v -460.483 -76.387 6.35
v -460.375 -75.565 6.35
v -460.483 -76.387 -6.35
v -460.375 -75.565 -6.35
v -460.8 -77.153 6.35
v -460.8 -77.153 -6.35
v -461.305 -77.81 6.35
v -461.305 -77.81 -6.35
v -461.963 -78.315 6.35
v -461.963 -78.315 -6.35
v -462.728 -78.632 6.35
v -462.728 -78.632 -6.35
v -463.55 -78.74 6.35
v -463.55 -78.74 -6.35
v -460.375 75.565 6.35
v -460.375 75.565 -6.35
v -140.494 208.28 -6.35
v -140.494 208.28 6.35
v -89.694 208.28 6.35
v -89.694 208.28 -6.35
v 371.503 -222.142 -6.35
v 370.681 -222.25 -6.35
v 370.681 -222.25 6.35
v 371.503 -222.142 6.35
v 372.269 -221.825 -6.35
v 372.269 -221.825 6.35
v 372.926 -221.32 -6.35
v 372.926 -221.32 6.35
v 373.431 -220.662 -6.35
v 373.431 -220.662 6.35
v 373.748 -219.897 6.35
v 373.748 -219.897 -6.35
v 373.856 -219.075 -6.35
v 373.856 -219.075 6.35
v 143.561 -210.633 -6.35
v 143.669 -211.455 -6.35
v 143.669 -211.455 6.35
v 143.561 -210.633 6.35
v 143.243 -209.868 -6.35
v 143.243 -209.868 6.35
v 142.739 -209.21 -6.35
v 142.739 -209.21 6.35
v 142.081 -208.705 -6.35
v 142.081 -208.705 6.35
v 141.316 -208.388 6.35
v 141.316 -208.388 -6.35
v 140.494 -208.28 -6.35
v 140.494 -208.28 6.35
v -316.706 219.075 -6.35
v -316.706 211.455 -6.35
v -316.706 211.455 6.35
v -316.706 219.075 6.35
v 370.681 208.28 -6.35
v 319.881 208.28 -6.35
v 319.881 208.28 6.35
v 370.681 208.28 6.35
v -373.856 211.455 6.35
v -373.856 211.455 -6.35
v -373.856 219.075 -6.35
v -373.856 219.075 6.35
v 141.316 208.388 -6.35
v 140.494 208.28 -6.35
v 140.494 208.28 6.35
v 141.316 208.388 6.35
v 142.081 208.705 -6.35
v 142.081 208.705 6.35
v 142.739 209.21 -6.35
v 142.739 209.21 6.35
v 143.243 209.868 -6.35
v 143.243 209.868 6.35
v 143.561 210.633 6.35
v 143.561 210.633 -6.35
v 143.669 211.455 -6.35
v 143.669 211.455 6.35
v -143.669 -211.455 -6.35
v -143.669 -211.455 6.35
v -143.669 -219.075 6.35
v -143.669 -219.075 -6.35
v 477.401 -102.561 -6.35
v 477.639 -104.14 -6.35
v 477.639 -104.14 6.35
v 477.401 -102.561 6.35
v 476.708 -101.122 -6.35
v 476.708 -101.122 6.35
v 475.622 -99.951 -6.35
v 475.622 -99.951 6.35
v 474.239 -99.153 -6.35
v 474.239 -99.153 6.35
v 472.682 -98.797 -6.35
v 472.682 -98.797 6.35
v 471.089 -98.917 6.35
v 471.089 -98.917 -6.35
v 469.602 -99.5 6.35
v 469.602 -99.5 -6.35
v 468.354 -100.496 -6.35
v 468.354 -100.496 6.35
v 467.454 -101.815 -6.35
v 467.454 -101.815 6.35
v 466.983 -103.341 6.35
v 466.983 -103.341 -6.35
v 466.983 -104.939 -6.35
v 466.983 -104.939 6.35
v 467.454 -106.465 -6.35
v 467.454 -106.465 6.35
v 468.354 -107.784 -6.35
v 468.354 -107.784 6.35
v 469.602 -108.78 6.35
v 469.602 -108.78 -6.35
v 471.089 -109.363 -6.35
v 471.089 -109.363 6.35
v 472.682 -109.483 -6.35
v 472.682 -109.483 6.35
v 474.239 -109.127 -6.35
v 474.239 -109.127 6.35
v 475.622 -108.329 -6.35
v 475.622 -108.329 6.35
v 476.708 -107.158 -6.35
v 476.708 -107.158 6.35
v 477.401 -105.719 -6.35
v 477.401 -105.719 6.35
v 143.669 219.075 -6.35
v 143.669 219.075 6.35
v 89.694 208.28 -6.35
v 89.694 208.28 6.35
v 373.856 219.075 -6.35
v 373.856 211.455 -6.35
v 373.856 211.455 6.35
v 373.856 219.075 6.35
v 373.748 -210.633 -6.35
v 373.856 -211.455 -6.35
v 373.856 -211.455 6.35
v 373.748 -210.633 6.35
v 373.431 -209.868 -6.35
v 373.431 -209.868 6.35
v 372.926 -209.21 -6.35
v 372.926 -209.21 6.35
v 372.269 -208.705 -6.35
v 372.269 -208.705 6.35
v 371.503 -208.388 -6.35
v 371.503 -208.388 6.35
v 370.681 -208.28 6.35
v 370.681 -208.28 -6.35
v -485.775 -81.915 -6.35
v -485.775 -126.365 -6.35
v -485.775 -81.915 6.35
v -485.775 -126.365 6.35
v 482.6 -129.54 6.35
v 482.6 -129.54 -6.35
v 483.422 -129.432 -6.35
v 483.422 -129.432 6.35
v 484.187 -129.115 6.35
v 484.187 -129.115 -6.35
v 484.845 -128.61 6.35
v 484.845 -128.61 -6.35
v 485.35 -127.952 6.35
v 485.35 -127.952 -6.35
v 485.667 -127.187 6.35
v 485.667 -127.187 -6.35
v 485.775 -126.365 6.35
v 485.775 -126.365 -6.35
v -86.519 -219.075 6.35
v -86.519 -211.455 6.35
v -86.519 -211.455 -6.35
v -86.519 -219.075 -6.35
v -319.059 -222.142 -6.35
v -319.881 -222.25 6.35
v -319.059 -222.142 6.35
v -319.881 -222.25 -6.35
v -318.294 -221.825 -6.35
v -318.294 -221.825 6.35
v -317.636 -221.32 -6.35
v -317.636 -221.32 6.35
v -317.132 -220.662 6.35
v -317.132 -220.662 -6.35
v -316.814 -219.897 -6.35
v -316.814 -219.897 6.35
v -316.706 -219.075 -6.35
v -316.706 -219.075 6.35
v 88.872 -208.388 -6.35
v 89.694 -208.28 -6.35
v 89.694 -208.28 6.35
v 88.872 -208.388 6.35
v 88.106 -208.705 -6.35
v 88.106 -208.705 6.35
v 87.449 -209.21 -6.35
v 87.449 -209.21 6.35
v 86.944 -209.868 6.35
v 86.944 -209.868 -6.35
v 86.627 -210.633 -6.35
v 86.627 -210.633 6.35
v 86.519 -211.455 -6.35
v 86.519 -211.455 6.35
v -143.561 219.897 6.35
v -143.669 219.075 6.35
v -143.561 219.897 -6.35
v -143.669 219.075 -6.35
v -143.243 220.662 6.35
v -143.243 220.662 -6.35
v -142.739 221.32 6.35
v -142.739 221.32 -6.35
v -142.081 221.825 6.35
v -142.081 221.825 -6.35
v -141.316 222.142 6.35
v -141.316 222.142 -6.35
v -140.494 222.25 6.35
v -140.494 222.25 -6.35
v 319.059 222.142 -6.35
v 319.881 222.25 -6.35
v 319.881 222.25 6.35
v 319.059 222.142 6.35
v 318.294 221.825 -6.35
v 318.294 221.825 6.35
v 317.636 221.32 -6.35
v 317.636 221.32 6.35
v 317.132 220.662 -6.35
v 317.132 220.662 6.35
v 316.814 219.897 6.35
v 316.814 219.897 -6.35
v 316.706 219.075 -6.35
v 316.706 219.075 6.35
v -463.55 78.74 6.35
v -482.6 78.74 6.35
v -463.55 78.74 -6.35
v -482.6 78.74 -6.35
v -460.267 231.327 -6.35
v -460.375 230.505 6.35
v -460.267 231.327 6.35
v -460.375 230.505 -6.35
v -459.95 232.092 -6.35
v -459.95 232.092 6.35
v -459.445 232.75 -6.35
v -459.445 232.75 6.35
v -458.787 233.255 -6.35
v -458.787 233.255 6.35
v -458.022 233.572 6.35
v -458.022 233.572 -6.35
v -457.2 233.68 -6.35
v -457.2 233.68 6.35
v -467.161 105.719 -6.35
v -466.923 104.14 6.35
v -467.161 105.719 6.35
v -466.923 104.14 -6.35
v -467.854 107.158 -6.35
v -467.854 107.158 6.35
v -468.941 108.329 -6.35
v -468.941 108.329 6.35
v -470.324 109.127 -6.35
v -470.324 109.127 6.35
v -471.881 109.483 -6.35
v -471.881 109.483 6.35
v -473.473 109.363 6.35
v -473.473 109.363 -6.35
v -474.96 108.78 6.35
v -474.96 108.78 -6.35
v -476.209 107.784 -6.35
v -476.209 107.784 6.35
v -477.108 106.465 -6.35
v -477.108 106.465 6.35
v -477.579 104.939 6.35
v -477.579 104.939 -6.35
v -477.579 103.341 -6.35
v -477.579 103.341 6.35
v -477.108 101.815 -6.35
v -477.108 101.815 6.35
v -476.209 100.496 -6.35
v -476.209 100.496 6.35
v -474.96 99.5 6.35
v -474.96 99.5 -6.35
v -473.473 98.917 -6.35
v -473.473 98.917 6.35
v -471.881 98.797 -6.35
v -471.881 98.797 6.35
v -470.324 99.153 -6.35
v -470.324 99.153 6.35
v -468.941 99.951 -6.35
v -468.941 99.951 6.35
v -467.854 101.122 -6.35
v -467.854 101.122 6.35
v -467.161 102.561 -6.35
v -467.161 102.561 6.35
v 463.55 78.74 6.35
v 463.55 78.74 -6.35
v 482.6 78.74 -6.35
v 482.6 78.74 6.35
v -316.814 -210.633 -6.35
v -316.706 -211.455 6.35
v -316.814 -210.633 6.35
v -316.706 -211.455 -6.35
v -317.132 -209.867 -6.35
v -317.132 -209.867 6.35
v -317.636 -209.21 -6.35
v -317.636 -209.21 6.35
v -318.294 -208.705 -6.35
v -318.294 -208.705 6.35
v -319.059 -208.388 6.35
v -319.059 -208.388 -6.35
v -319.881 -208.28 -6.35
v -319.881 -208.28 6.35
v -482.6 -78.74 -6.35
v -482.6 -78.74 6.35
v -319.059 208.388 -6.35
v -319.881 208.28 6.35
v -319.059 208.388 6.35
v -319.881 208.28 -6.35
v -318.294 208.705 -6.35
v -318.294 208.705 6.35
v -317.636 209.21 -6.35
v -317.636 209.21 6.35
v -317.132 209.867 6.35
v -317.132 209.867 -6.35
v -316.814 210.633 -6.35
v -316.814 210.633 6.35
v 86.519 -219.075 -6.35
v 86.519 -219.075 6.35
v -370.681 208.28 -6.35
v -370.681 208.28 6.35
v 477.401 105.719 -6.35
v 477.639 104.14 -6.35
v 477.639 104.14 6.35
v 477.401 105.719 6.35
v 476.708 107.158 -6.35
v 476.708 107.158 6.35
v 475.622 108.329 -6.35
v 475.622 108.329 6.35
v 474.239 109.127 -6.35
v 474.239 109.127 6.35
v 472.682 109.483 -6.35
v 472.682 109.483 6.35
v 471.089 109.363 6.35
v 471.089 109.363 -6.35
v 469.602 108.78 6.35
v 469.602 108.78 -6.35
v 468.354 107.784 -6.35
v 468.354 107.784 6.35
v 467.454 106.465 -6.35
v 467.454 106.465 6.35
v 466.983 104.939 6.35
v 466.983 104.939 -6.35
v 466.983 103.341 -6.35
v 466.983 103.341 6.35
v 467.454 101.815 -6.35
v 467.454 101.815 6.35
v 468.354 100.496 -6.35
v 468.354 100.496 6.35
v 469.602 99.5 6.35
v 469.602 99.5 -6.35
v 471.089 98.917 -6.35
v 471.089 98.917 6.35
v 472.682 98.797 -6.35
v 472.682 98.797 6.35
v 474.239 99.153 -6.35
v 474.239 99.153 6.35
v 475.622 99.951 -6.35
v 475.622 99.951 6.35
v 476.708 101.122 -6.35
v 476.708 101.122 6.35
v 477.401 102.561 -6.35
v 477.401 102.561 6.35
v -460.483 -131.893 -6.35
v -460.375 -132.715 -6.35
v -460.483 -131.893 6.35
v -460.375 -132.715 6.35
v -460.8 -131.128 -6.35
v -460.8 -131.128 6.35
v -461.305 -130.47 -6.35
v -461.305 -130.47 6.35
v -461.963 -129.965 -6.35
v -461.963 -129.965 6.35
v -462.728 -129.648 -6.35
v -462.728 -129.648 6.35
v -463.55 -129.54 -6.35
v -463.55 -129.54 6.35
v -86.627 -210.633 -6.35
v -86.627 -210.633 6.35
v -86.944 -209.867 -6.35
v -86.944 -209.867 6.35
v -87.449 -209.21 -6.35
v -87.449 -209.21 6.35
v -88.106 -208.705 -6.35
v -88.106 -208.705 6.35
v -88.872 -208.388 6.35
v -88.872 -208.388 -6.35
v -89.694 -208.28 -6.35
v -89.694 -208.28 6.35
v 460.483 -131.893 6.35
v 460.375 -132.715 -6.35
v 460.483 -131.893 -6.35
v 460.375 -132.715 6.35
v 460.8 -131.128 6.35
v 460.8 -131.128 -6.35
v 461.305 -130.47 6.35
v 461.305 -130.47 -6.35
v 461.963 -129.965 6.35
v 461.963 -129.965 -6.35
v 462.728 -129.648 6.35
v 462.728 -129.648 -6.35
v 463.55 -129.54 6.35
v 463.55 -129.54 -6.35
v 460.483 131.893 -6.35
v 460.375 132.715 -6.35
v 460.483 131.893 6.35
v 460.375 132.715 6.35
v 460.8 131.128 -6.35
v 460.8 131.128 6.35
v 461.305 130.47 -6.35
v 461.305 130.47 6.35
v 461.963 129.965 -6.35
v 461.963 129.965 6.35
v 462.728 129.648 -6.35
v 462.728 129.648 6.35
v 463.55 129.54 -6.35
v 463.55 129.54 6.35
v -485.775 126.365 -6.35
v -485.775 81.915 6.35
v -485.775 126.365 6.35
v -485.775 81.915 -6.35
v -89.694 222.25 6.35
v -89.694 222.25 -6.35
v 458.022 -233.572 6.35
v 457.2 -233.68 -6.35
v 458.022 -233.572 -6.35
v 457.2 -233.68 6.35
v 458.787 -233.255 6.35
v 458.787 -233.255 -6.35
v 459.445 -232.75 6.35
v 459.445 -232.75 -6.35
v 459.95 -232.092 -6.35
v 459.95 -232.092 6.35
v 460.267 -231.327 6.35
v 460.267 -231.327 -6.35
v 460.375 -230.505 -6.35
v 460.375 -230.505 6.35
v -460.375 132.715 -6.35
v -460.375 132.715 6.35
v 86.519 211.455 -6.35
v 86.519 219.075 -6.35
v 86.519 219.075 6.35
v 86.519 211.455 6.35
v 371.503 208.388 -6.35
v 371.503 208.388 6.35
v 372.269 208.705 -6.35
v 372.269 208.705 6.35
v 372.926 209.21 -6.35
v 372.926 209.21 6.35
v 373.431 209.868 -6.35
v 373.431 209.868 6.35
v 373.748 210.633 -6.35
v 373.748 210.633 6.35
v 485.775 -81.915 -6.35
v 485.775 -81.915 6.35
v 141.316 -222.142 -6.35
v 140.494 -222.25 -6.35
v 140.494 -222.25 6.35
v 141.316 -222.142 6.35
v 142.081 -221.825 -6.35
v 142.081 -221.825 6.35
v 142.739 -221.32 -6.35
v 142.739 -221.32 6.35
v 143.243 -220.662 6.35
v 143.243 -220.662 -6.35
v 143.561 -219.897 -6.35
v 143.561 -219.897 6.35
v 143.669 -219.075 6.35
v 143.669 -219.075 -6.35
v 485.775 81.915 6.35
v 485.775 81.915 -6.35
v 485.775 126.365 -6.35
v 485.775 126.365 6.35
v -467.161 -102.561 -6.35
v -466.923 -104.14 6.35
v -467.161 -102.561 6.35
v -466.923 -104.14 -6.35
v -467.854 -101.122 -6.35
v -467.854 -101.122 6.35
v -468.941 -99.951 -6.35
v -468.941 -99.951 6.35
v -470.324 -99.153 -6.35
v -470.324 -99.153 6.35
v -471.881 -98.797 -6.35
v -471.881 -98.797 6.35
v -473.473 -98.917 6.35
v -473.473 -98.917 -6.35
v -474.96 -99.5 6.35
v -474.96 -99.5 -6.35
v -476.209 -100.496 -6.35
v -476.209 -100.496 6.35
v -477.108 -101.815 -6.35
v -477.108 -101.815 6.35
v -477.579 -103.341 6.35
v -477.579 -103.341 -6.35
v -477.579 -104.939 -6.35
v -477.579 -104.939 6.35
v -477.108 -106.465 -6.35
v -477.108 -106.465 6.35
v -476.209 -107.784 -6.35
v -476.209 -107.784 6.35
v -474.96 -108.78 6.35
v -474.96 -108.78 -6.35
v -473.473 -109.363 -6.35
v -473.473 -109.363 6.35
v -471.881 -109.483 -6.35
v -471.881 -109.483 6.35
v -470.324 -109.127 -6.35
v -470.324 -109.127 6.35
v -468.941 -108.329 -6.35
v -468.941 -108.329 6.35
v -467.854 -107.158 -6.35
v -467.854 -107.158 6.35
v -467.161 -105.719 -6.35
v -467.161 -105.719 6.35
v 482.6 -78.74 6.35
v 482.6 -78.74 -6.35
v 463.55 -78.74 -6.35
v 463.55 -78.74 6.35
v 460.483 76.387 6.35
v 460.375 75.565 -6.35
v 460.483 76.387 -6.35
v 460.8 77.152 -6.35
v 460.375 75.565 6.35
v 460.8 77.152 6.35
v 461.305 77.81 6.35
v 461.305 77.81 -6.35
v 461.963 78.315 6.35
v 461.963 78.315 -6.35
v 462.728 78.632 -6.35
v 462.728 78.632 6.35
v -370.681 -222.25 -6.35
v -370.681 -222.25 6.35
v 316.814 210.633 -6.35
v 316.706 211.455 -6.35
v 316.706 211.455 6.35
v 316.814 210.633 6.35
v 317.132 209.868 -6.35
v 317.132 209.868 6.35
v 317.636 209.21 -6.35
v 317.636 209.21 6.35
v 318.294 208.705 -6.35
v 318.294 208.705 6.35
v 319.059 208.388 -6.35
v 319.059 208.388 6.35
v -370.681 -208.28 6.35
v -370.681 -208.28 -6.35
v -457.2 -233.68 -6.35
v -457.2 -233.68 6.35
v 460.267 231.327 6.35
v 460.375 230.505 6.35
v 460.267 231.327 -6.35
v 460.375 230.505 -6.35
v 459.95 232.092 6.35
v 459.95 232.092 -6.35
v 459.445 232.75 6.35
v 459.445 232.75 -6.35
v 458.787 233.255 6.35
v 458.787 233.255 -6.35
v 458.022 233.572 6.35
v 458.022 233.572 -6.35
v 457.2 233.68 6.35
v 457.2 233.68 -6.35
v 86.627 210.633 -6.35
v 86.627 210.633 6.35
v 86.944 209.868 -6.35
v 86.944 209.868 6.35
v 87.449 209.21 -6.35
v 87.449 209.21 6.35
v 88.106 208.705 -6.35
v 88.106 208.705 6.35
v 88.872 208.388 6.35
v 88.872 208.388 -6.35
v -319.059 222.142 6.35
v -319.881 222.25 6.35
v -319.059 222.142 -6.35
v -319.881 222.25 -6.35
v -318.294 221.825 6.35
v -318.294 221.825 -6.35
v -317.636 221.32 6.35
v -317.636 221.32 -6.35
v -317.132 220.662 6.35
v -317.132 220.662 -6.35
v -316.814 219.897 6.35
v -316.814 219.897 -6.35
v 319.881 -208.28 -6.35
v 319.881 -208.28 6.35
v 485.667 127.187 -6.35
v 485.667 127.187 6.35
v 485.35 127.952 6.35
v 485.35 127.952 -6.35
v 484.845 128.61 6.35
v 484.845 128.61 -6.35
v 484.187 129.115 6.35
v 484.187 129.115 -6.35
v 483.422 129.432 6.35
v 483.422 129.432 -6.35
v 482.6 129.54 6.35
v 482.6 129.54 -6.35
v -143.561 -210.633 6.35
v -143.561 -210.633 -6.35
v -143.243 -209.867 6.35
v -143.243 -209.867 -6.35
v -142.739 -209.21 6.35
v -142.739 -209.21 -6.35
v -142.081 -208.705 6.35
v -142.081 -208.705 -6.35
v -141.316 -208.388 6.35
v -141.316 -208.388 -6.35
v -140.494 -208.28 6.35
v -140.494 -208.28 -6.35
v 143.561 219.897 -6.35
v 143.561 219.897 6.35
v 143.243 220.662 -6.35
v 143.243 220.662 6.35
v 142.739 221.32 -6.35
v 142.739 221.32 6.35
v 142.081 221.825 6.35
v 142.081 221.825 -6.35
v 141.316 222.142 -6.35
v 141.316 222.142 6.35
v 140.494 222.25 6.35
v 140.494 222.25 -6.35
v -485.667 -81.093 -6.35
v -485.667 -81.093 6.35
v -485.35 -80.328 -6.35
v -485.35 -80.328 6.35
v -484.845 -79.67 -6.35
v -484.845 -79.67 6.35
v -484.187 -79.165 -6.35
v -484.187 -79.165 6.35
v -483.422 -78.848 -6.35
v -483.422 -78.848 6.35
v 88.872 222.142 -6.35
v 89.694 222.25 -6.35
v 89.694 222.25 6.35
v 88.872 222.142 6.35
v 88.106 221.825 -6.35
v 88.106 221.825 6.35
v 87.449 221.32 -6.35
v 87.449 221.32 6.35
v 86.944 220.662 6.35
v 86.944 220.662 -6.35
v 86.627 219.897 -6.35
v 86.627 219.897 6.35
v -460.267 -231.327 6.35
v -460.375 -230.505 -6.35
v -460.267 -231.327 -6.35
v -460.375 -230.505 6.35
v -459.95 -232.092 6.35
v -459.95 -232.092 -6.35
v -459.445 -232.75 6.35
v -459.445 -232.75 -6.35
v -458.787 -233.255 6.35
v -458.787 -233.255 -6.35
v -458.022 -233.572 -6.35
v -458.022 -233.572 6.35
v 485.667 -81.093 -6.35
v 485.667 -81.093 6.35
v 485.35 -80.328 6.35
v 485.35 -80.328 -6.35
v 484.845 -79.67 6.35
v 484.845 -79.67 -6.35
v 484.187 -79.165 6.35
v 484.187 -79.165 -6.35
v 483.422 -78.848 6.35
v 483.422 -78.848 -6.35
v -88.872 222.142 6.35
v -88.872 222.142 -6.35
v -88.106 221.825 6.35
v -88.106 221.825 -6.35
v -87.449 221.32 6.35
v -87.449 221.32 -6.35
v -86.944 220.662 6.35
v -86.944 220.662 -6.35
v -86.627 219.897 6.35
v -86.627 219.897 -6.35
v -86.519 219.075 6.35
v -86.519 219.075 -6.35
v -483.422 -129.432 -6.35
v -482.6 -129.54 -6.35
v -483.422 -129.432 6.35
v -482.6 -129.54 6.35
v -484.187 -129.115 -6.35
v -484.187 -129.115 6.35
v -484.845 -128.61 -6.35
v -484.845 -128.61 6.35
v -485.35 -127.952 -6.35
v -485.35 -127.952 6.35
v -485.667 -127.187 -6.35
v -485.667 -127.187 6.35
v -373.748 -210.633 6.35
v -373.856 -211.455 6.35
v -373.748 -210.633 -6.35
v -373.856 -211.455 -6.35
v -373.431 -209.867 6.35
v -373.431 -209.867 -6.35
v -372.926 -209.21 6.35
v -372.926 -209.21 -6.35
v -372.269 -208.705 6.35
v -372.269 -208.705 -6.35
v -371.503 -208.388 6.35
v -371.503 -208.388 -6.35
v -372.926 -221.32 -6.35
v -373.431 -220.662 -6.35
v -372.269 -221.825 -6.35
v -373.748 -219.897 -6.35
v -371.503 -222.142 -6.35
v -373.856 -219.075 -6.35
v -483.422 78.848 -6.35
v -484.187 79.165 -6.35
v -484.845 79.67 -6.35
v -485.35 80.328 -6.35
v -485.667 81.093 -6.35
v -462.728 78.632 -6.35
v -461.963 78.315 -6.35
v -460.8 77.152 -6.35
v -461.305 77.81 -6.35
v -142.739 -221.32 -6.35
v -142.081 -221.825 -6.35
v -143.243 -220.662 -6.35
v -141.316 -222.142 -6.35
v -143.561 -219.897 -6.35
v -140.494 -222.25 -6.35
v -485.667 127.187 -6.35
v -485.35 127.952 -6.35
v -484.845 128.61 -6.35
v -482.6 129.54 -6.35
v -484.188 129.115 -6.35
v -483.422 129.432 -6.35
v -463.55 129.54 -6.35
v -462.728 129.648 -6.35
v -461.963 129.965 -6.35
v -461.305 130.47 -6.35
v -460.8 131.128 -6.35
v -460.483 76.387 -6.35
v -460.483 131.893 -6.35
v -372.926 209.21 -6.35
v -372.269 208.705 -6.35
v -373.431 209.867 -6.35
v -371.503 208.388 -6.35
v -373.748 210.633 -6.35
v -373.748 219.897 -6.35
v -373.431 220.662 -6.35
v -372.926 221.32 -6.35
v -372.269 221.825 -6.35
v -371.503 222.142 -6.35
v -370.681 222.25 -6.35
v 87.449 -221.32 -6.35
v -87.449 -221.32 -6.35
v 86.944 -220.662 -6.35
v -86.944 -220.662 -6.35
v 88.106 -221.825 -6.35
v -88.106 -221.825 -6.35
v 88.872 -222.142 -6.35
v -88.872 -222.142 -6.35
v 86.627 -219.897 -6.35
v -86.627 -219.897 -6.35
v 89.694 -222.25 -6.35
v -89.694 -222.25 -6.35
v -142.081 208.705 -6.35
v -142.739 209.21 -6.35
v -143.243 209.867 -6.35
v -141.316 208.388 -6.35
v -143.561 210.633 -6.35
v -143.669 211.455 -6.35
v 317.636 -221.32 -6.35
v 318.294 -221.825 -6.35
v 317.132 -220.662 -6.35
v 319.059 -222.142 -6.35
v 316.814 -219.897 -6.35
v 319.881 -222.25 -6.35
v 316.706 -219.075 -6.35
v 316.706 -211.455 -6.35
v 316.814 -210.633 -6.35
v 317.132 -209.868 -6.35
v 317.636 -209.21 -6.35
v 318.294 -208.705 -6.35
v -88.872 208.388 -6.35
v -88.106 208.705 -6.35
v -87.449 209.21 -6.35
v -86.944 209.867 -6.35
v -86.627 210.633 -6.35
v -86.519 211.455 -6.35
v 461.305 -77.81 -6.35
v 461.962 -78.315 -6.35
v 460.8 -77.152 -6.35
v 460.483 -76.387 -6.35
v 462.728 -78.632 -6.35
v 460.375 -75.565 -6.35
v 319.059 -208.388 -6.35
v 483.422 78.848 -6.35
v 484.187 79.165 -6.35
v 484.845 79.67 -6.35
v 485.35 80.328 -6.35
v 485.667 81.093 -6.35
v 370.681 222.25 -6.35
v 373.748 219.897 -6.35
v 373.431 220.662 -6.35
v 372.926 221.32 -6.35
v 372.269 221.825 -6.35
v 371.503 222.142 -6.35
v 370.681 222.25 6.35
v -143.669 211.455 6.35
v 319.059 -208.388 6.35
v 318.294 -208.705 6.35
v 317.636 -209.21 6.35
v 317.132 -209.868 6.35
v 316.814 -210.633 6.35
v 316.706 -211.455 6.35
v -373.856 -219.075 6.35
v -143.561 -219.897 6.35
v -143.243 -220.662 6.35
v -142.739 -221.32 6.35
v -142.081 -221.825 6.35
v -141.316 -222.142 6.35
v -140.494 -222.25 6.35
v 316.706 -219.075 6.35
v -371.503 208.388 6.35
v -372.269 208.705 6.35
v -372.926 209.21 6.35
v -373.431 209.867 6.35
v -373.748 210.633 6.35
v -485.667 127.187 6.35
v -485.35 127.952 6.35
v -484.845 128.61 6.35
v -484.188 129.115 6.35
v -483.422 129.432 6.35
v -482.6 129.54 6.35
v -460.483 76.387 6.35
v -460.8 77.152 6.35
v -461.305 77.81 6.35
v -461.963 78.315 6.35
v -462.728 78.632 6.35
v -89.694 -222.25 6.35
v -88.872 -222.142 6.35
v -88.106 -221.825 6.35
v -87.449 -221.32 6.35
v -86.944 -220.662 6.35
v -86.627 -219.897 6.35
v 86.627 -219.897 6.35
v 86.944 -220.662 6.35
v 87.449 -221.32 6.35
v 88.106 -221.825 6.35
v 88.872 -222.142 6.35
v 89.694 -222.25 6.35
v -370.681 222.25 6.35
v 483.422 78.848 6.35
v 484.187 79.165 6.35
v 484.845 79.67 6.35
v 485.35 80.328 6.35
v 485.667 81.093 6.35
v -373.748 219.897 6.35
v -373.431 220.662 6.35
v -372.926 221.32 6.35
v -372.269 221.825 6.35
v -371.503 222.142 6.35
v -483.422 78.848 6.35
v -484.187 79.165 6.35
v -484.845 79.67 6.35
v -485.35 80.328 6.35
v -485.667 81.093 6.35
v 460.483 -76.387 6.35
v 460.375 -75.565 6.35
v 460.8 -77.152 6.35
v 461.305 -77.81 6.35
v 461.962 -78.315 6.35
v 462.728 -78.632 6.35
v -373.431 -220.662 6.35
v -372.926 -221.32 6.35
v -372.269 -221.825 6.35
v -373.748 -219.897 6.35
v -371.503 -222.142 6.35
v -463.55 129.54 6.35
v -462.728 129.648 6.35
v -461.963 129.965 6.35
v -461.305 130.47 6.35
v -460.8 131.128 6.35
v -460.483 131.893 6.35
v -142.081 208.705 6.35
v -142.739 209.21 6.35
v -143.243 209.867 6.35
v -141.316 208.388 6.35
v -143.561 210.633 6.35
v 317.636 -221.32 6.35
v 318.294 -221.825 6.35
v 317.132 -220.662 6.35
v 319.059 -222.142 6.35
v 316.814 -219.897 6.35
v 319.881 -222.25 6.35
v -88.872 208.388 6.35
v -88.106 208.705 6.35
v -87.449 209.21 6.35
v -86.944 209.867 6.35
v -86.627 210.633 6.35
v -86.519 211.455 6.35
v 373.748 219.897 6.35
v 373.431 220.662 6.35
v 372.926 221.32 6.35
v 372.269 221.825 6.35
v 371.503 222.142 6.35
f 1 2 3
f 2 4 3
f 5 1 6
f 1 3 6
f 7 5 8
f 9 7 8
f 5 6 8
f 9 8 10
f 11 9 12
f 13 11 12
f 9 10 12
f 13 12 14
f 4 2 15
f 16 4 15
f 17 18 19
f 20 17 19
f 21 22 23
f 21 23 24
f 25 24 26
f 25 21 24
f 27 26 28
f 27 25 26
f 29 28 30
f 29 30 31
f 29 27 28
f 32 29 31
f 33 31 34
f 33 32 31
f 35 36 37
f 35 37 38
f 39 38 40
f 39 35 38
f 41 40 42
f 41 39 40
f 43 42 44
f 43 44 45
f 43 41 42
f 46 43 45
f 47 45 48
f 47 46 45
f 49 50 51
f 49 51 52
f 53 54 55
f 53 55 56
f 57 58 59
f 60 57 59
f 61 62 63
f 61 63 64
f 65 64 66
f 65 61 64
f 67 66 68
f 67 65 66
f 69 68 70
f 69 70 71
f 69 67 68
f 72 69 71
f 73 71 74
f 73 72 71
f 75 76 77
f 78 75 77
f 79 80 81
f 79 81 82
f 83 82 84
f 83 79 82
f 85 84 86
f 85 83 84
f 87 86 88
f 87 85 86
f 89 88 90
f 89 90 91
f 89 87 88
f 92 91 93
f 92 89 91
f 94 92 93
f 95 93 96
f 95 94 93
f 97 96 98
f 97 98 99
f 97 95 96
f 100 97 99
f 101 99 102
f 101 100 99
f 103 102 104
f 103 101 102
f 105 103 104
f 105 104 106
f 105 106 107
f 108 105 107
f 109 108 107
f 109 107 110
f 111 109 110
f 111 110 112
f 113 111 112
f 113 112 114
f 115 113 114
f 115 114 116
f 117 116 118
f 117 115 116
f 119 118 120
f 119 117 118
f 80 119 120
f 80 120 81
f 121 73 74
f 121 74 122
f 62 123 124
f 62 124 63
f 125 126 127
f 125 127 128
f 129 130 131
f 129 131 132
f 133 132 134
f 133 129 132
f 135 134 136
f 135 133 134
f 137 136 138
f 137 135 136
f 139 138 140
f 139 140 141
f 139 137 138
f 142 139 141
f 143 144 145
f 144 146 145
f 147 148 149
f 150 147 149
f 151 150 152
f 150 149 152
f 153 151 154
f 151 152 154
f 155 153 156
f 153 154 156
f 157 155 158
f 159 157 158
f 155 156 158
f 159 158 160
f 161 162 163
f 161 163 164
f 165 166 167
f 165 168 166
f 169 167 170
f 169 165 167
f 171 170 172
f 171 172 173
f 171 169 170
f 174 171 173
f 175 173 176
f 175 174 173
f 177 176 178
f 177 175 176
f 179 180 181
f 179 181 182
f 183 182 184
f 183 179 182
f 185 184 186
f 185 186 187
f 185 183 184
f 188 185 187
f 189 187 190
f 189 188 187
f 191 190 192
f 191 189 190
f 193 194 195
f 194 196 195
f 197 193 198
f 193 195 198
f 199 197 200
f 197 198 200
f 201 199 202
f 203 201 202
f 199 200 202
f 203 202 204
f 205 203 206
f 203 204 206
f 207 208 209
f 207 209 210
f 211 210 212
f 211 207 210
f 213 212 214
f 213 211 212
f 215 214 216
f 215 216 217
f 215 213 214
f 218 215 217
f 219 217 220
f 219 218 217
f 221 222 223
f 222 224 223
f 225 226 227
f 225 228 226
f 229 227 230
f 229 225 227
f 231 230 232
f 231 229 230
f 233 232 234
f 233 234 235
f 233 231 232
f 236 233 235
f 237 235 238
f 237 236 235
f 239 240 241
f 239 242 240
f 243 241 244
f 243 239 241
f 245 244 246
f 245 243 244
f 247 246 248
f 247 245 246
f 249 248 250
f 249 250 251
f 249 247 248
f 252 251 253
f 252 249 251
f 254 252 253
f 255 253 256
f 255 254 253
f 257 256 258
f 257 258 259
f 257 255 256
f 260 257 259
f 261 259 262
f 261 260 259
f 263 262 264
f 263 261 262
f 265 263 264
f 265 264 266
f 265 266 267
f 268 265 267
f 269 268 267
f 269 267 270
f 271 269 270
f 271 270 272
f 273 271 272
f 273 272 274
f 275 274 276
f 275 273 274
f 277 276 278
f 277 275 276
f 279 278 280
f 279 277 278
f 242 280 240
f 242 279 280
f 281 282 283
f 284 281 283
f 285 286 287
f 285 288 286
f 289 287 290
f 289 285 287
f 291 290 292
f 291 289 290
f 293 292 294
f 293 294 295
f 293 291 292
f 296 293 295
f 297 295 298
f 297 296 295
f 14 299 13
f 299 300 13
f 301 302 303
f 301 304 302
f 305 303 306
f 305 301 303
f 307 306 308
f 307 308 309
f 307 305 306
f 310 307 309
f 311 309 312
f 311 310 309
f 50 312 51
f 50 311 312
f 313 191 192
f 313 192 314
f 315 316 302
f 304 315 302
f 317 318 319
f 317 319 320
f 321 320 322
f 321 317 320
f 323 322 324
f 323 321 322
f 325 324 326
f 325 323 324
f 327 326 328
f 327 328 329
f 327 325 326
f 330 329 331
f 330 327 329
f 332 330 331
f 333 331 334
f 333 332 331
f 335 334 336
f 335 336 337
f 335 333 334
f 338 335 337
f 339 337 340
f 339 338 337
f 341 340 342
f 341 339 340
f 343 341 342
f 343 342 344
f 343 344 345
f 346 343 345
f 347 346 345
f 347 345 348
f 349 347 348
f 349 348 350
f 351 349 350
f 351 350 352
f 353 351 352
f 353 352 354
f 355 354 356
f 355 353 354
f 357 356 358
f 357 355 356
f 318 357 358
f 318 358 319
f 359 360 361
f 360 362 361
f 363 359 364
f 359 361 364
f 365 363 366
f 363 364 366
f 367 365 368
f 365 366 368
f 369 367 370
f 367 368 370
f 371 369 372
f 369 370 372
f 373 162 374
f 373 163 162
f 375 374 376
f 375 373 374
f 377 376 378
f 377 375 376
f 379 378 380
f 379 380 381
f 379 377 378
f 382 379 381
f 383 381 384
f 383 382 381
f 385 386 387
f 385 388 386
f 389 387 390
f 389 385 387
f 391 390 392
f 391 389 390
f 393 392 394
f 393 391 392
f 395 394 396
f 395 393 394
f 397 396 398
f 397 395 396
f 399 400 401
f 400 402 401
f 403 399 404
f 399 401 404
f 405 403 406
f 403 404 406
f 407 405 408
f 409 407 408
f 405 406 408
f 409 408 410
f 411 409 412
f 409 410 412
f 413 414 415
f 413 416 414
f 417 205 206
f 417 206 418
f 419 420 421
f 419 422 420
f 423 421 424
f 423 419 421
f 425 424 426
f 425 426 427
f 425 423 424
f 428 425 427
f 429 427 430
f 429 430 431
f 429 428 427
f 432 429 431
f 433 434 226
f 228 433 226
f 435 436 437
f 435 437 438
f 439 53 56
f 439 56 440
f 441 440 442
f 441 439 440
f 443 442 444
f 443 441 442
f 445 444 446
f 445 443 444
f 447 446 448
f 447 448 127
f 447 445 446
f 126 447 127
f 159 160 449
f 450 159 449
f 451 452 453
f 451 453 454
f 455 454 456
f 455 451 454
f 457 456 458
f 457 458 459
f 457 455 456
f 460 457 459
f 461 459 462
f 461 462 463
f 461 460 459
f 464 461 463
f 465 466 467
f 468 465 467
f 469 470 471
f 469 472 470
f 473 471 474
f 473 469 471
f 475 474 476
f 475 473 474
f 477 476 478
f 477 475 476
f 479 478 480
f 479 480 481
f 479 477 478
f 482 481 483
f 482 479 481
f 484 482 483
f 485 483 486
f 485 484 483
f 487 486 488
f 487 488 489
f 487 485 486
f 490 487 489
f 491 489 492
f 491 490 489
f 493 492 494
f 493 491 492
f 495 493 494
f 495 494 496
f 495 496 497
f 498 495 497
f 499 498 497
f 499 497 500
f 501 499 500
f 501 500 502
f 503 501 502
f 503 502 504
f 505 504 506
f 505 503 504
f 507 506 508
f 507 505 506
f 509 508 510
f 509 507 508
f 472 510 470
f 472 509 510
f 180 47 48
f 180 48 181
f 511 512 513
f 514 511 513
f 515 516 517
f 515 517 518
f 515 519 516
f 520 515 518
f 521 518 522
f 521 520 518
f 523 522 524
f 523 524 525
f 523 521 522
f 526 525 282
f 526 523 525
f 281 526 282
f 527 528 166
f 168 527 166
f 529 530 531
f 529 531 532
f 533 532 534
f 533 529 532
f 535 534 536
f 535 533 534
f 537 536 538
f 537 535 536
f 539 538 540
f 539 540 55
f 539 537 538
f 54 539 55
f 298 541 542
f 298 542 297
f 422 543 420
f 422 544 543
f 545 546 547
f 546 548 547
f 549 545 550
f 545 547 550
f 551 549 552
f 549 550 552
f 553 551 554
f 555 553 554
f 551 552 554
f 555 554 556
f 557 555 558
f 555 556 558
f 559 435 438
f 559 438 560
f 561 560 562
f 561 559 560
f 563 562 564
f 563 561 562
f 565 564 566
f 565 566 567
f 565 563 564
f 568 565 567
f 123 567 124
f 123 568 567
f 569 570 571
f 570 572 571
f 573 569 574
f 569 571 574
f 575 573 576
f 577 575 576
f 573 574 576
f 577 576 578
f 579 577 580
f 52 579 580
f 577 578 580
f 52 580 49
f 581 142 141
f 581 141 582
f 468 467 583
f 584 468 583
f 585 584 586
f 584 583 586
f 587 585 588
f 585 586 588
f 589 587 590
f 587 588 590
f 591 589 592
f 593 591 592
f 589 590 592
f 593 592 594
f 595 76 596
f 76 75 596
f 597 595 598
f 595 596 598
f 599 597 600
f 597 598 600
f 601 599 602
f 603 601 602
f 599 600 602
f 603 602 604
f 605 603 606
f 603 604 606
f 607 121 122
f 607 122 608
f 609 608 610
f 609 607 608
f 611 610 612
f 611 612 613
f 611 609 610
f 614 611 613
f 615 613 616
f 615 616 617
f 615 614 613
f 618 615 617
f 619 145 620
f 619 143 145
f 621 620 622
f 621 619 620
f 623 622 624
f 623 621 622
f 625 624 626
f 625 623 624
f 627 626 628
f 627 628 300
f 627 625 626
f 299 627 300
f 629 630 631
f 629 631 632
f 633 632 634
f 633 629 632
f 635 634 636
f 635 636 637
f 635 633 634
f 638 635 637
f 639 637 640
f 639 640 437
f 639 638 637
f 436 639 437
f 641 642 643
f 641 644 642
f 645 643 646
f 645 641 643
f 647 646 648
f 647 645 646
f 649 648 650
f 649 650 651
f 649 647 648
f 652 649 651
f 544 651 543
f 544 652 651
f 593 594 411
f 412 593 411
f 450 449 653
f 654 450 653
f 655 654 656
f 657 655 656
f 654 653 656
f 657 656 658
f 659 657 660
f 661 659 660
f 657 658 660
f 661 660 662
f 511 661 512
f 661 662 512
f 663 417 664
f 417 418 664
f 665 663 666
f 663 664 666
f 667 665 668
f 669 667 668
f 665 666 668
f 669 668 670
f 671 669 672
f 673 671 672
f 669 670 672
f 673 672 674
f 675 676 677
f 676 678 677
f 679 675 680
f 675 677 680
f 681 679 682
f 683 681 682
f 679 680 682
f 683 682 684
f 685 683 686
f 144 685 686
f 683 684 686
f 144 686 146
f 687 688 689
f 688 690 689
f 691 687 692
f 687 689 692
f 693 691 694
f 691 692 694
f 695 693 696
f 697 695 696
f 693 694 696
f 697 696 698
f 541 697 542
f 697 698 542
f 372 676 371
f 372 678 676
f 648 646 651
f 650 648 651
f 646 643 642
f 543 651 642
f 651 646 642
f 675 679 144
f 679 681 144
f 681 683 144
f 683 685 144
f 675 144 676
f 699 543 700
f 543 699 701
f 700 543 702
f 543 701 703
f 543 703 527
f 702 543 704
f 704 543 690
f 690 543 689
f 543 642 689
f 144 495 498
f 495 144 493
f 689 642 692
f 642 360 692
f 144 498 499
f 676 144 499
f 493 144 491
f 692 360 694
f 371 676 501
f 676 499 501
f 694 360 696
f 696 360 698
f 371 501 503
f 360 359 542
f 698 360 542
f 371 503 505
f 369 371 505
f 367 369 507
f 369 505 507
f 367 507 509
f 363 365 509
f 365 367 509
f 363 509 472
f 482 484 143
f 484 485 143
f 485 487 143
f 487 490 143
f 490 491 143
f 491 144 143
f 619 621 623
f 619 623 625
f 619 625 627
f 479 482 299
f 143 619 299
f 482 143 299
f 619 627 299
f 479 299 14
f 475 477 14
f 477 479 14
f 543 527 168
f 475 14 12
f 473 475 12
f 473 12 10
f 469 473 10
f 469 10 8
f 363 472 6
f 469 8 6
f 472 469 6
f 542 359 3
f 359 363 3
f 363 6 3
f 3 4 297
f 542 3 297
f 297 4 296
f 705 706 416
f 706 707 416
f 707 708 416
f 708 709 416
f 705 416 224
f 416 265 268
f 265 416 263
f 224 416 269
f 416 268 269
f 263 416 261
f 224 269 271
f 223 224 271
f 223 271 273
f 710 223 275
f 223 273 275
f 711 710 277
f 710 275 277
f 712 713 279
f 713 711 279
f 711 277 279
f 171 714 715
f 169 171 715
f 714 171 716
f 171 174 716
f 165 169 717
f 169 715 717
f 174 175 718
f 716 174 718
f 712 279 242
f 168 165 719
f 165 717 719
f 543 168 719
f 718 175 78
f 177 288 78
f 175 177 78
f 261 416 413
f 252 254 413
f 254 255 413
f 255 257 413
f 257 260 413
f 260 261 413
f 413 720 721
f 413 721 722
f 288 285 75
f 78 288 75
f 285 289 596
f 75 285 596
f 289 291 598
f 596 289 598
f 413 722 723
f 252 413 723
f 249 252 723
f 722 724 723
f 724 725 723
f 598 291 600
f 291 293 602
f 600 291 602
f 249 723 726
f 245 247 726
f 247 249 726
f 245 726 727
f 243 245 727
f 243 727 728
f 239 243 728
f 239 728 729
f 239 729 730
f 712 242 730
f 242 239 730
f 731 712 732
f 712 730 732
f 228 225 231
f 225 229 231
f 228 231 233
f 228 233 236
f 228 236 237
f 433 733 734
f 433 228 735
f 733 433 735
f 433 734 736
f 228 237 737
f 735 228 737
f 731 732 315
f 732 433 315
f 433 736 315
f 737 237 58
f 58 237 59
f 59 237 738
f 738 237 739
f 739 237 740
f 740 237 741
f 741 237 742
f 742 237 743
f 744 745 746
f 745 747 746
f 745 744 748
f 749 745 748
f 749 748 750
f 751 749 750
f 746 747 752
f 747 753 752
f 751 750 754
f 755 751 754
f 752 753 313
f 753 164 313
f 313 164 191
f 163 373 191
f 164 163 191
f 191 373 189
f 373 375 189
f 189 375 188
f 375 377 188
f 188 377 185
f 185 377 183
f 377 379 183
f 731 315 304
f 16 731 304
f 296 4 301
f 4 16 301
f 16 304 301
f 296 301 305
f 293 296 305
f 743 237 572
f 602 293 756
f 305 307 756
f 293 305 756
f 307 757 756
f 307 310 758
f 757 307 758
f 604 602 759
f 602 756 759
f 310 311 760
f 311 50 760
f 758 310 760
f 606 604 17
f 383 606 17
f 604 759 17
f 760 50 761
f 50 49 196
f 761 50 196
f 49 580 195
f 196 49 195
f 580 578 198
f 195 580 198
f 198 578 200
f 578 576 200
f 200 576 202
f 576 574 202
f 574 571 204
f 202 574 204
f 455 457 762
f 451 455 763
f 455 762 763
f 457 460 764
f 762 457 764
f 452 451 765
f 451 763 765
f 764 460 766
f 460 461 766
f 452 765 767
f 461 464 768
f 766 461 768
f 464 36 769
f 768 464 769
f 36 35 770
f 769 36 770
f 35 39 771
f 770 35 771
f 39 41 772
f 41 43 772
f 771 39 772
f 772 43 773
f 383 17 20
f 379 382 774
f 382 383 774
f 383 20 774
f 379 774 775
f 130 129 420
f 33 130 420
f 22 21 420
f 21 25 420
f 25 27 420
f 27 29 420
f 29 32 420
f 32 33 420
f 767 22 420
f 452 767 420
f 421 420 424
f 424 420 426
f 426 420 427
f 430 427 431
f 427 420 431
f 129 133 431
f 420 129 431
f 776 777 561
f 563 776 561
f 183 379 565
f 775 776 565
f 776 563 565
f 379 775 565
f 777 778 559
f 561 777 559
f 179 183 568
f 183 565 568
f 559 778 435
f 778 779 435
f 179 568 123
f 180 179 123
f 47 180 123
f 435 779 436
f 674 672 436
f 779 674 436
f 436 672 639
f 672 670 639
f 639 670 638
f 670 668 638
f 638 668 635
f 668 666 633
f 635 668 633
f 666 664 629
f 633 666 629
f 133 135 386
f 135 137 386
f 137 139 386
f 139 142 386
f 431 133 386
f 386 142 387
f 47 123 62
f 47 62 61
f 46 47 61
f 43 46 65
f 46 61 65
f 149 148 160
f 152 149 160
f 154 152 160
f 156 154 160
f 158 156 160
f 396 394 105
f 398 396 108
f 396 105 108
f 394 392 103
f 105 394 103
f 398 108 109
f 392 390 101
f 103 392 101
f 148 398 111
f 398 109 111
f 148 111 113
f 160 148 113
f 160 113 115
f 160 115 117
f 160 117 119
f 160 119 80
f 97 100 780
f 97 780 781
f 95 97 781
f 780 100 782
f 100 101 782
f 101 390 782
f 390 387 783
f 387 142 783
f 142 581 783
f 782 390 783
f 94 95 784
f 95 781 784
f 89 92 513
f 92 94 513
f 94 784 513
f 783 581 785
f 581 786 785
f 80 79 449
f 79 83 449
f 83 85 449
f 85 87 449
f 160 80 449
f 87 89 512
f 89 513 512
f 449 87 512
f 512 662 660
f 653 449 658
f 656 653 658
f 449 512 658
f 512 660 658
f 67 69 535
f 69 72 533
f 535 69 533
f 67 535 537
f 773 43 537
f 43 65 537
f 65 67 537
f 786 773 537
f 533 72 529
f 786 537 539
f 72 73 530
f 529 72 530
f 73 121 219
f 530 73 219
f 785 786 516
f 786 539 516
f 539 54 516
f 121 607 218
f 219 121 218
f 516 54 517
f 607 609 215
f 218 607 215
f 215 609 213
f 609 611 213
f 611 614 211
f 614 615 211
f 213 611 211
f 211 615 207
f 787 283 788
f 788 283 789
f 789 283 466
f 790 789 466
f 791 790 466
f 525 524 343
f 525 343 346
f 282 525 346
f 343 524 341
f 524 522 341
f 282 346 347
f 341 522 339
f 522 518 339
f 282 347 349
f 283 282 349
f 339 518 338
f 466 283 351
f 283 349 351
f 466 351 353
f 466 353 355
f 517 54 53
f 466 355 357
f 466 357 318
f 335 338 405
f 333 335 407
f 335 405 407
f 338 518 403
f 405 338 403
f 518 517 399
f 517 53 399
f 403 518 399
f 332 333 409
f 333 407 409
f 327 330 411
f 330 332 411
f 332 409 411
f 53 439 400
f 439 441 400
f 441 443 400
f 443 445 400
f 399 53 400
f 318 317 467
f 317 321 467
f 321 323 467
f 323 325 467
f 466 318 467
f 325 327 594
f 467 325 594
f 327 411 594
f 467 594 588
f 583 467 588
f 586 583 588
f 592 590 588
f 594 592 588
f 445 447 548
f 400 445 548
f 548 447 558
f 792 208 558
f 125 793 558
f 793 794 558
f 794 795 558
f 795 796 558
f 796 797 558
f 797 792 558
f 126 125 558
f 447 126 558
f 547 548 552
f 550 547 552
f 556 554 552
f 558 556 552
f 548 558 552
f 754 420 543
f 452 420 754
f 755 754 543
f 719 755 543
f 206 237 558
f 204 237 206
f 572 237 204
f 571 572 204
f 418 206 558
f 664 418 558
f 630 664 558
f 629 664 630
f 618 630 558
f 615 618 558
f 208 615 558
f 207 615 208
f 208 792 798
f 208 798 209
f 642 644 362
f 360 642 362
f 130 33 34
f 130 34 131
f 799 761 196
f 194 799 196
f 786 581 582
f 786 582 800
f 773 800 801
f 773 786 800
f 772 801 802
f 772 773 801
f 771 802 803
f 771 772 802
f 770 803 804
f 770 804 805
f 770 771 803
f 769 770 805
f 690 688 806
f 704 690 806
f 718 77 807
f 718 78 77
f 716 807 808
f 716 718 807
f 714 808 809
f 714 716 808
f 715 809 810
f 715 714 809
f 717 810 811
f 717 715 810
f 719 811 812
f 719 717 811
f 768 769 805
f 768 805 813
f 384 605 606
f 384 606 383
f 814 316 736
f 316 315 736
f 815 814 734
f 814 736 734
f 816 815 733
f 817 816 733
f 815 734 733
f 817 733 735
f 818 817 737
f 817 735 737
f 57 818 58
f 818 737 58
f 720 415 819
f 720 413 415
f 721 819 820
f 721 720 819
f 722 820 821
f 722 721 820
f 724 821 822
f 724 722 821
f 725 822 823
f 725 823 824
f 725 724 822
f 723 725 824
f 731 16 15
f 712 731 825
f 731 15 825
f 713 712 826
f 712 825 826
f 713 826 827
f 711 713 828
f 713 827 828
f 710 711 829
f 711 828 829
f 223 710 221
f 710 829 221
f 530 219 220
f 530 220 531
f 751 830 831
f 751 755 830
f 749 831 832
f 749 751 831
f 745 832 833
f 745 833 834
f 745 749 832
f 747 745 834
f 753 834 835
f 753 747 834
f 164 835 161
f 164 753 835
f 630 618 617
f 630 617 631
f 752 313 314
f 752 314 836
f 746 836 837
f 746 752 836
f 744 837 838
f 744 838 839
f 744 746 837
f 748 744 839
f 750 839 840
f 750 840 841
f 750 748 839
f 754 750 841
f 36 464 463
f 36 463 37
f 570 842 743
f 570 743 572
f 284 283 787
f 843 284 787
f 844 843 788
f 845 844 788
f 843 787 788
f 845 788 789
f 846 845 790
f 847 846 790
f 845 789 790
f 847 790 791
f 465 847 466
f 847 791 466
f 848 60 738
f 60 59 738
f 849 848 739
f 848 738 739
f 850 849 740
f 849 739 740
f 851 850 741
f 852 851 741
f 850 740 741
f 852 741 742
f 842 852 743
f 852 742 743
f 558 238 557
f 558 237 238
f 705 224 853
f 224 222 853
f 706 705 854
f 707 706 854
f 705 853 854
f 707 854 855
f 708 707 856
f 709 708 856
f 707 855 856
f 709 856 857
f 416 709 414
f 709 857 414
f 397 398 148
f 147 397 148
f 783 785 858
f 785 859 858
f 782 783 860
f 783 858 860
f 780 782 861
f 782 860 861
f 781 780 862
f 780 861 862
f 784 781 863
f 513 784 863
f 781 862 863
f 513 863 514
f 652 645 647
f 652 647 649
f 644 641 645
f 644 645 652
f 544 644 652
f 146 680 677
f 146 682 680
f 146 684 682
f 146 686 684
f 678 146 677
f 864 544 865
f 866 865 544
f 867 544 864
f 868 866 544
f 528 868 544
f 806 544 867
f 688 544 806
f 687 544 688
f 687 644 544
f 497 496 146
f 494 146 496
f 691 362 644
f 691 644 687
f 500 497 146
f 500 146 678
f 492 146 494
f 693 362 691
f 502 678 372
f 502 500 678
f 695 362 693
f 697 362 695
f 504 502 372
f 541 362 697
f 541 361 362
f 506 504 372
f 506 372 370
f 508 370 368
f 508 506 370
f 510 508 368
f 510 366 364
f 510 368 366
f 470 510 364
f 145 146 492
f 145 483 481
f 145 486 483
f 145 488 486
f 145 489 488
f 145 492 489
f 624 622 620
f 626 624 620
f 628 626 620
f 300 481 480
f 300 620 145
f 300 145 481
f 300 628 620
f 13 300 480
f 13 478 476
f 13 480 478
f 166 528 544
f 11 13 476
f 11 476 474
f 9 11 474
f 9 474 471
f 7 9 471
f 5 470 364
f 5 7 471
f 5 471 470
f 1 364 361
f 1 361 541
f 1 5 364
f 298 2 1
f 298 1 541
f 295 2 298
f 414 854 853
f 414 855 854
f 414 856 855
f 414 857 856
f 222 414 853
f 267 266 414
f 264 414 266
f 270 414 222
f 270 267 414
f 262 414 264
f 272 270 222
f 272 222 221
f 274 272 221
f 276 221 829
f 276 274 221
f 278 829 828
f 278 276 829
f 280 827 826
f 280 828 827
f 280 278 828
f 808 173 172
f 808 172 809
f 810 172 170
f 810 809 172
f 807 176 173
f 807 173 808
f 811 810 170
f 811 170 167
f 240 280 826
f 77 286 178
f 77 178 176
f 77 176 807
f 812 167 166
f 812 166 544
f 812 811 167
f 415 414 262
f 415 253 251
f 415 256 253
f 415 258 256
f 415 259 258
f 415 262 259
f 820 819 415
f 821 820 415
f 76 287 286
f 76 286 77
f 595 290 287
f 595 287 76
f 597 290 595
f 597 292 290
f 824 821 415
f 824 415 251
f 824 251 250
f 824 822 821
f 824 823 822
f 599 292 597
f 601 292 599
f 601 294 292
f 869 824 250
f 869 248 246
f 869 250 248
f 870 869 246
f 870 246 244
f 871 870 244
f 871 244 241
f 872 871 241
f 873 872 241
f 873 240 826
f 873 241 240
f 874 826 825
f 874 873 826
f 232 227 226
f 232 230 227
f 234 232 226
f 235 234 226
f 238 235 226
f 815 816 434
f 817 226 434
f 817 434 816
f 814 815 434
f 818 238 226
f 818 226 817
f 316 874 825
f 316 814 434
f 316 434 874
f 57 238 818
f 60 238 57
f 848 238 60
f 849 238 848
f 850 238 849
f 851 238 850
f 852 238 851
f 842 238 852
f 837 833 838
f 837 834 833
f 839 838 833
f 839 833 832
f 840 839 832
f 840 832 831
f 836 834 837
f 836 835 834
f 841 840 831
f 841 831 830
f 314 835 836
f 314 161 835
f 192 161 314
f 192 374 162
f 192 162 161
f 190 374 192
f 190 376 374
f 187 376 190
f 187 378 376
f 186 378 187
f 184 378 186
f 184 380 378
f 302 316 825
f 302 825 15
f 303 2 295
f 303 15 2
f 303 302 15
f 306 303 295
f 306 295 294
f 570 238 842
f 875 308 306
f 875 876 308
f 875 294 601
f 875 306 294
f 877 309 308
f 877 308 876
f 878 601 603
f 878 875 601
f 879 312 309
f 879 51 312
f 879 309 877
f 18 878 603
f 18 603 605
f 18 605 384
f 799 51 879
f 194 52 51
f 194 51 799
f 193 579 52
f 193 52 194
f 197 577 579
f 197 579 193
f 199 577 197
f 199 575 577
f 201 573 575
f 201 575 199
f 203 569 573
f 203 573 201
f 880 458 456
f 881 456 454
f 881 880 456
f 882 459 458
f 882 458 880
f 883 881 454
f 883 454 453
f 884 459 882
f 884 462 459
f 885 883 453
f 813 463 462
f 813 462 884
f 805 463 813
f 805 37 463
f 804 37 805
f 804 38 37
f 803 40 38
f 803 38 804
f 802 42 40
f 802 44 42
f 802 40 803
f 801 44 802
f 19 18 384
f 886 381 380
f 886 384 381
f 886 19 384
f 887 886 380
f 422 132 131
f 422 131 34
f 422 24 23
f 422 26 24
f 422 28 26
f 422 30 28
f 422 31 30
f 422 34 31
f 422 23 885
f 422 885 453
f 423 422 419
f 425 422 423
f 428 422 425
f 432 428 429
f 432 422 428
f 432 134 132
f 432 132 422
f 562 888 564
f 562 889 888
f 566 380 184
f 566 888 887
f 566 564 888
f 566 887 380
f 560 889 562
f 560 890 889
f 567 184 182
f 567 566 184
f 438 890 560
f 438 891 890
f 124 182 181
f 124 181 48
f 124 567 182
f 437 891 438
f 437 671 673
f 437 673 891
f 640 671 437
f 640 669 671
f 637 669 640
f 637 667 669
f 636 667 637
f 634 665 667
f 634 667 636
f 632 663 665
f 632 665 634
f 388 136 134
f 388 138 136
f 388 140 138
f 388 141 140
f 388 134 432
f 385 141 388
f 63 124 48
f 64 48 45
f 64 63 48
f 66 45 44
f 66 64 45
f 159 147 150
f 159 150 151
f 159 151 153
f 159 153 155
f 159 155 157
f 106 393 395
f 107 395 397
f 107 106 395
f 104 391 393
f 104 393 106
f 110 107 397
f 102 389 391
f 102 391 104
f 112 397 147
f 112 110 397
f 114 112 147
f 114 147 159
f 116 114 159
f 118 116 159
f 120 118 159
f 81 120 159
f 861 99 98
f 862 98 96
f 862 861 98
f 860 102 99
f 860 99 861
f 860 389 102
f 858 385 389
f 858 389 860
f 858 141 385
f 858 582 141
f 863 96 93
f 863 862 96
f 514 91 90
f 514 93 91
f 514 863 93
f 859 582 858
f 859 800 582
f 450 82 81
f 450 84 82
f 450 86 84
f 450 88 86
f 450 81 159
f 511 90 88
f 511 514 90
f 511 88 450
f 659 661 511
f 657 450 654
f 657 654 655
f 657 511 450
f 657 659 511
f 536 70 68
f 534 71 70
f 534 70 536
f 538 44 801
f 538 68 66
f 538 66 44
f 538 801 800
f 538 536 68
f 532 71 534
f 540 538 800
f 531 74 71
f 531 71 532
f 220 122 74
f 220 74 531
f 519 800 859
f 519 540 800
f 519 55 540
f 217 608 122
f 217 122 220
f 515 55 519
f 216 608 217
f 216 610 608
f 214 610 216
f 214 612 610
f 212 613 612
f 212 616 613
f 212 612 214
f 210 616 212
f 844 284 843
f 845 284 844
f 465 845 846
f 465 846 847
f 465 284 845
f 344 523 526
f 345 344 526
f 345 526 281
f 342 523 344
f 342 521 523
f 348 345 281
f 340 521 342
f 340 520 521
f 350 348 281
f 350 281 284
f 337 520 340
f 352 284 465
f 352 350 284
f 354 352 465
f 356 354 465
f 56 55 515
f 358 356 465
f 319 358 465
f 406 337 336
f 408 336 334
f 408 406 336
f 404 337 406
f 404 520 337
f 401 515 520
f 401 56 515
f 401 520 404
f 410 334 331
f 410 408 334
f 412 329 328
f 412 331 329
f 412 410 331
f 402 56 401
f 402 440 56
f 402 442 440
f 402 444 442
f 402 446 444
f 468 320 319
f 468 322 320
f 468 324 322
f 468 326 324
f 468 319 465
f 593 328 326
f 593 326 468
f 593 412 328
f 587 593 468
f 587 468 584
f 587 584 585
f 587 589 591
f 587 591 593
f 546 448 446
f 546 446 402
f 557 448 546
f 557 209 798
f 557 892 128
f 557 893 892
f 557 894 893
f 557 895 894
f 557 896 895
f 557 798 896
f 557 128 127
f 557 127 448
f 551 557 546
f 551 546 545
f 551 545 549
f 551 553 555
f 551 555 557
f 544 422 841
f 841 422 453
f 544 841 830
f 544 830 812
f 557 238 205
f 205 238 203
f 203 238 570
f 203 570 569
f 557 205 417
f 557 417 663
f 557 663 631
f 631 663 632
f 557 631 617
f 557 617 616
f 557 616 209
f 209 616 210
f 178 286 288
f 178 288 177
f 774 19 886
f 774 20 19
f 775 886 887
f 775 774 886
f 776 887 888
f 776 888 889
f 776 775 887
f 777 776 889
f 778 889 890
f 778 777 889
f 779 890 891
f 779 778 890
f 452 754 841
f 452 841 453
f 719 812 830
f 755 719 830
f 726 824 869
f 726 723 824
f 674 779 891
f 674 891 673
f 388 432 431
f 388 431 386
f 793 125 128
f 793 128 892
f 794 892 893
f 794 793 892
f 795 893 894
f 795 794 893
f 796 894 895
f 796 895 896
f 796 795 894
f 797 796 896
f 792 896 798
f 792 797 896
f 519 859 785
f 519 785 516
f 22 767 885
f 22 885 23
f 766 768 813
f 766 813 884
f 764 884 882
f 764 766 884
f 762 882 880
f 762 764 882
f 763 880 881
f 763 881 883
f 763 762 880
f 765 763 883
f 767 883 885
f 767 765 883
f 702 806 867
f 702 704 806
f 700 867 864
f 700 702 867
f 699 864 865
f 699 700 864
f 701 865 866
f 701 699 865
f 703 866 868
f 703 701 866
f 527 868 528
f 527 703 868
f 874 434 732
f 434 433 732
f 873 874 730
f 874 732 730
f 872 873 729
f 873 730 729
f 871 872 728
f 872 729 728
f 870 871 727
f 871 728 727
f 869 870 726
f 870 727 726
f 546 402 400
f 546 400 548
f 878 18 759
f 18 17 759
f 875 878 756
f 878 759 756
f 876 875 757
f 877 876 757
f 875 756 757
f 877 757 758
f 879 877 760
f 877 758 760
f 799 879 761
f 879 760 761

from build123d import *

# Parameters (mm, degrees)
SKETCH1_W            = 920.75
SKETCH1_H            = 416.56
BOSS_EXTRUDE1_DEPTH  = 6.35
SKETCH2_W            = 920.75
SKETCH2_H            = 25.4
BOSS_EXTRUDE2_DEPTH  = 6.35
SKETCH3_W            = 57.15
SKETCH3_H            = 13.97
TAB_HOLES_DEPTH      = 517.442419854
SKETCH4_W            = 25.4
SKETCH4_H            = 50.8
SKETCH4_R            = 5.3578125
TABS_DEPTH           = 6.35
FILLET1_R            = 3.175
FILLET2_R            = 3.175
FILLET2_OF_MIRROR2_R = 3.175
MIRROR4_START        = -6.35
MIRROR4_DEPTH        = 12.7
MIRROR4_2_OUTLINE_R  = 5.3578125
MIRROR4_2_DEPTH      = 12.7
FILLET3_R            = 3.175


# Read off the part's stored shape, not the designer's step: Mirror4
with BuildPart() as part:
    # Sketch1 → Boss-Extrude1 (new, symmetric)
    with BuildSketch(Plane.XY):
        Rectangle(SKETCH1_W, SKETCH1_H)
    extrude(amount=BOSS_EXTRUDE1_DEPTH, both=True)

    # Sketch2 → Boss-Extrude2 (add, symmetric)
    with BuildSketch(Plane.XY):
        with Locations((0, 220.98)):
            Rectangle(SKETCH2_W, SKETCH2_H)
        with Locations((0, -220.98)):
            Rectangle(SKETCH2_W, SKETCH2_H)
    extrude(amount=BOSS_EXTRUDE2_DEPTH, both=True)

    # Sketch3 → Tab Holes (cut, through all)
    with BuildSketch(Plane.XY.offset(6.35)):
        with Locations((-345.28125, 215.265)):
            Rectangle(SKETCH3_W, SKETCH3_H)
        with Locations((-115.09375, 215.265)):
            Rectangle(SKETCH3_W, SKETCH3_H)
    tab_holes = extrude(amount=-TAB_HOLES_DEPTH, mode=Mode.SUBTRACT)

    # Sketch4 → Tabs (add, symmetric)
    # profile 1 of 2: a face of its own
    with BuildSketch(Plane.XY):
        with Locations((-473.075, 104.14)):
            Rectangle(SKETCH4_W, SKETCH4_H)
        with Locations((-472.28125, 104.14)):
            Circle(SKETCH4_R, mode=Mode.SUBTRACT)
    # profile 2 of 2: a face of its own
    with BuildSketch(Plane.XY):
        with Locations((-473.075, -104.14)):
            Rectangle(SKETCH4_W, SKETCH4_H)
        with Locations((-472.28125, -104.14)):
            Circle(SKETCH4_R, mode=Mode.SUBTRACT)
    extrude(amount=TABS_DEPTH, both=True)

    # Fillet1
    fillet1_edges = [part.edges().sort_by_distance(p)[0] for p in [
        (-460.375, 233.68, 0),
        (-460.375, -233.68, 0),
        (-460.375, 78.74, 0),
        (-460.375, 129.54, 0),
        (-485.775, 129.54, 0),
        (-485.775, 78.74, 0),
        (-460.375, -129.54, 0),
        (-460.375, -78.74, 0),
        (-485.775, -78.74, 0),
        (-485.775, -129.54, 0),
    ]]
    fillet(fillet1_edges, radius=FILLET1_R)

    # Fillet2
    fillet2_edges = [part.edges().sort_by_distance(p)[0] for p in [
        (-373.85625, 208.28, 0),
        (-373.85625, 222.25, 0),
        (-316.70625, 222.25, 0),
        (-316.70625, 208.28, 0),
        (-143.66875, 208.28, 0),
        (-143.66875, 222.25, 0),
        (-86.51875, 222.25, 0),
        (-86.51875, 208.28, 0),
    ]]
    fillet(fillet2_edges, radius=FILLET2_R)

    # Mirror2: Tab Holes across plane
    add(tab_holes.mirror(Plane.ZX), mode=Mode.SUBTRACT)

    # Fillet2 of Mirror2
    fillet2_of_mirror2_edges = [part.edges().sort_by_distance(p)[0] for p in [
        (-373.85625, -208.28, 0),
        (-373.85625, -222.25, 0),
        (-316.70625, -222.25, 0),
        (-316.70625, -208.28, 0),
        (-143.66875, -208.28, 0),
        (-143.66875, -222.25, 0),
        (-86.51875, -222.25, 0),
        (-86.51875, -208.28, 0),
    ]]
    fillet(fillet2_of_mirror2_edges, radius=FILLET2_OF_MIRROR2_R)

    # Mirror4 outline → Mirror4 (cut)
    with BuildSketch(Plane.XY.offset(MIRROR4_START)):
        with BuildLine():
            Line((140.49375, 222.25), (89.69375, 222.25))
            ThreePointArc((89.69375, 222.25), (87.44868597, 221.32006403), (86.51875, 219.075))
            Line((86.51875, 219.075), (86.51875, 211.455))
            ThreePointArc((86.51875, 211.455), (87.44868597, 209.20993597), (89.69375, 208.28))
            Line((89.69375, 208.28), (140.49375, 208.28))
            ThreePointArc((140.49375, 208.28), (142.73881403, 209.20993597), (143.66875, 211.455))
            Line((143.66875, 211.455), (143.66875, 219.075))
            ThreePointArc((143.66875, 219.075), (142.73881403, 221.32006403), (140.49375, 222.25))
        make_face()
        with BuildLine():
            Line((370.68125, 222.25), (319.88125, 222.25))
            ThreePointArc((319.88125, 222.25), (317.63618597, 221.32006403), (316.70625, 219.075))
            Line((316.70625, 219.075), (316.70625, 211.455))
            ThreePointArc((316.70625, 211.455), (317.63618597, 209.20993597), (319.88125, 208.28))
            Line((319.88125, 208.28), (370.68125, 208.28))
            ThreePointArc((370.68125, 208.28), (372.92631403, 209.20993597), (373.85625, 211.455))
            Line((373.85625, 211.455), (373.85625, 219.075))
            ThreePointArc((373.85625, 219.075), (372.92631403, 221.32006403), (370.68125, 222.25))
        make_face()
        with BuildLine():
            ThreePointArc((143.66875, -211.455), (142.73881403, -209.20993597), (140.49375, -208.28))
            Line((140.49375, -208.28), (89.69375, -208.28))
            ThreePointArc((89.69375, -208.28), (87.44868597, -209.20993597), (86.51875, -211.455))
            Line((86.51875, -211.455), (86.51875, -219.075))
            ThreePointArc((86.51875, -219.075), (87.44868597, -221.32006403), (89.69375, -222.25))
            Line((89.69375, -222.25), (140.49375, -222.25))
            ThreePointArc((140.49375, -222.25), (142.73881403, -221.32006403), (143.66875, -219.075))
            Line((143.66875, -219.075), (143.66875, -211.455))
        make_face()
        with BuildLine():
            ThreePointArc((373.85625, -211.455), (372.92631403, -209.20993597), (370.68125, -208.28))
            Line((370.68125, -208.28), (319.88125, -208.28))
            ThreePointArc((319.88125, -208.28), (317.63618597, -209.20993597), (316.70625, -211.455))
            Line((316.70625, -211.455), (316.70625, -219.075))
            ThreePointArc((316.70625, -219.075), (317.63618597, -221.32006403), (319.88125, -222.25))
            Line((319.88125, -222.25), (370.68125, -222.25))
            ThreePointArc((370.68125, -222.25), (372.92631403, -221.32006403), (373.85625, -219.075))
            Line((373.85625, -219.075), (373.85625, -211.455))
        make_face()
    extrude(amount=MIRROR4_DEPTH, mode=Mode.SUBTRACT)

    # Mirror4 2 outline → Mirror4 2 (add)
    # profile 1 of 2: a face of its own
    with BuildSketch(Plane.XY.offset(MIRROR4_START)):
        with BuildLine():
            ThreePointArc((485.775, 126.365), (484.84506403, 128.61006403), (482.6, 129.54))
            Line((482.6, 129.54), (460.375, 129.54))
            Line((460.375, 129.54), (460.375, 78.74))
            Line((460.375, 78.74), (482.6, 78.74))
            ThreePointArc((482.6, 78.74), (484.84506403, 79.66993597), (485.775, 81.915))
            Line((485.775, 81.915), (485.775, 126.365))
        make_face()
        with Locations((472.28125, 104.14)):
            Circle(MIRROR4_2_OUTLINE_R, mode=Mode.SUBTRACT)
    # profile 2 of 2: a face of its own
    with BuildSketch(Plane.XY.offset(MIRROR4_START)):
        with BuildLine():
            Line((482.6, -78.74), (460.375, -78.74))
            Line((460.375, -78.74), (460.375, -129.54))
            Line((460.375, -129.54), (482.6, -129.54))
            ThreePointArc((482.6, -129.54), (484.84506403, -128.61006403), (485.775, -126.365))
            Line((485.775, -126.365), (485.775, -81.915))
            ThreePointArc((485.775, -81.915), (484.84506403, -79.66993597), (482.6, -78.74))
        make_face()
        with Locations((472.28125, -104.14)):
            Circle(MIRROR4_2_OUTLINE_R, mode=Mode.SUBTRACT)
    extrude(amount=MIRROR4_2_DEPTH)

    # Fillet3
    fillet3_edges = [part.edges().sort_by_distance(p)[0] for p in [
        (460.375, 233.68, 0),
        (460.375, -233.68, 0),
        (460.375, 129.54, 0),
        (460.375, 78.74, 0),
        (460.375, -78.74, 0),
        (460.375, -129.54, 0),
    ]]
    fillet(fillet3_edges, radius=FILLET3_R)


solid = part.part
